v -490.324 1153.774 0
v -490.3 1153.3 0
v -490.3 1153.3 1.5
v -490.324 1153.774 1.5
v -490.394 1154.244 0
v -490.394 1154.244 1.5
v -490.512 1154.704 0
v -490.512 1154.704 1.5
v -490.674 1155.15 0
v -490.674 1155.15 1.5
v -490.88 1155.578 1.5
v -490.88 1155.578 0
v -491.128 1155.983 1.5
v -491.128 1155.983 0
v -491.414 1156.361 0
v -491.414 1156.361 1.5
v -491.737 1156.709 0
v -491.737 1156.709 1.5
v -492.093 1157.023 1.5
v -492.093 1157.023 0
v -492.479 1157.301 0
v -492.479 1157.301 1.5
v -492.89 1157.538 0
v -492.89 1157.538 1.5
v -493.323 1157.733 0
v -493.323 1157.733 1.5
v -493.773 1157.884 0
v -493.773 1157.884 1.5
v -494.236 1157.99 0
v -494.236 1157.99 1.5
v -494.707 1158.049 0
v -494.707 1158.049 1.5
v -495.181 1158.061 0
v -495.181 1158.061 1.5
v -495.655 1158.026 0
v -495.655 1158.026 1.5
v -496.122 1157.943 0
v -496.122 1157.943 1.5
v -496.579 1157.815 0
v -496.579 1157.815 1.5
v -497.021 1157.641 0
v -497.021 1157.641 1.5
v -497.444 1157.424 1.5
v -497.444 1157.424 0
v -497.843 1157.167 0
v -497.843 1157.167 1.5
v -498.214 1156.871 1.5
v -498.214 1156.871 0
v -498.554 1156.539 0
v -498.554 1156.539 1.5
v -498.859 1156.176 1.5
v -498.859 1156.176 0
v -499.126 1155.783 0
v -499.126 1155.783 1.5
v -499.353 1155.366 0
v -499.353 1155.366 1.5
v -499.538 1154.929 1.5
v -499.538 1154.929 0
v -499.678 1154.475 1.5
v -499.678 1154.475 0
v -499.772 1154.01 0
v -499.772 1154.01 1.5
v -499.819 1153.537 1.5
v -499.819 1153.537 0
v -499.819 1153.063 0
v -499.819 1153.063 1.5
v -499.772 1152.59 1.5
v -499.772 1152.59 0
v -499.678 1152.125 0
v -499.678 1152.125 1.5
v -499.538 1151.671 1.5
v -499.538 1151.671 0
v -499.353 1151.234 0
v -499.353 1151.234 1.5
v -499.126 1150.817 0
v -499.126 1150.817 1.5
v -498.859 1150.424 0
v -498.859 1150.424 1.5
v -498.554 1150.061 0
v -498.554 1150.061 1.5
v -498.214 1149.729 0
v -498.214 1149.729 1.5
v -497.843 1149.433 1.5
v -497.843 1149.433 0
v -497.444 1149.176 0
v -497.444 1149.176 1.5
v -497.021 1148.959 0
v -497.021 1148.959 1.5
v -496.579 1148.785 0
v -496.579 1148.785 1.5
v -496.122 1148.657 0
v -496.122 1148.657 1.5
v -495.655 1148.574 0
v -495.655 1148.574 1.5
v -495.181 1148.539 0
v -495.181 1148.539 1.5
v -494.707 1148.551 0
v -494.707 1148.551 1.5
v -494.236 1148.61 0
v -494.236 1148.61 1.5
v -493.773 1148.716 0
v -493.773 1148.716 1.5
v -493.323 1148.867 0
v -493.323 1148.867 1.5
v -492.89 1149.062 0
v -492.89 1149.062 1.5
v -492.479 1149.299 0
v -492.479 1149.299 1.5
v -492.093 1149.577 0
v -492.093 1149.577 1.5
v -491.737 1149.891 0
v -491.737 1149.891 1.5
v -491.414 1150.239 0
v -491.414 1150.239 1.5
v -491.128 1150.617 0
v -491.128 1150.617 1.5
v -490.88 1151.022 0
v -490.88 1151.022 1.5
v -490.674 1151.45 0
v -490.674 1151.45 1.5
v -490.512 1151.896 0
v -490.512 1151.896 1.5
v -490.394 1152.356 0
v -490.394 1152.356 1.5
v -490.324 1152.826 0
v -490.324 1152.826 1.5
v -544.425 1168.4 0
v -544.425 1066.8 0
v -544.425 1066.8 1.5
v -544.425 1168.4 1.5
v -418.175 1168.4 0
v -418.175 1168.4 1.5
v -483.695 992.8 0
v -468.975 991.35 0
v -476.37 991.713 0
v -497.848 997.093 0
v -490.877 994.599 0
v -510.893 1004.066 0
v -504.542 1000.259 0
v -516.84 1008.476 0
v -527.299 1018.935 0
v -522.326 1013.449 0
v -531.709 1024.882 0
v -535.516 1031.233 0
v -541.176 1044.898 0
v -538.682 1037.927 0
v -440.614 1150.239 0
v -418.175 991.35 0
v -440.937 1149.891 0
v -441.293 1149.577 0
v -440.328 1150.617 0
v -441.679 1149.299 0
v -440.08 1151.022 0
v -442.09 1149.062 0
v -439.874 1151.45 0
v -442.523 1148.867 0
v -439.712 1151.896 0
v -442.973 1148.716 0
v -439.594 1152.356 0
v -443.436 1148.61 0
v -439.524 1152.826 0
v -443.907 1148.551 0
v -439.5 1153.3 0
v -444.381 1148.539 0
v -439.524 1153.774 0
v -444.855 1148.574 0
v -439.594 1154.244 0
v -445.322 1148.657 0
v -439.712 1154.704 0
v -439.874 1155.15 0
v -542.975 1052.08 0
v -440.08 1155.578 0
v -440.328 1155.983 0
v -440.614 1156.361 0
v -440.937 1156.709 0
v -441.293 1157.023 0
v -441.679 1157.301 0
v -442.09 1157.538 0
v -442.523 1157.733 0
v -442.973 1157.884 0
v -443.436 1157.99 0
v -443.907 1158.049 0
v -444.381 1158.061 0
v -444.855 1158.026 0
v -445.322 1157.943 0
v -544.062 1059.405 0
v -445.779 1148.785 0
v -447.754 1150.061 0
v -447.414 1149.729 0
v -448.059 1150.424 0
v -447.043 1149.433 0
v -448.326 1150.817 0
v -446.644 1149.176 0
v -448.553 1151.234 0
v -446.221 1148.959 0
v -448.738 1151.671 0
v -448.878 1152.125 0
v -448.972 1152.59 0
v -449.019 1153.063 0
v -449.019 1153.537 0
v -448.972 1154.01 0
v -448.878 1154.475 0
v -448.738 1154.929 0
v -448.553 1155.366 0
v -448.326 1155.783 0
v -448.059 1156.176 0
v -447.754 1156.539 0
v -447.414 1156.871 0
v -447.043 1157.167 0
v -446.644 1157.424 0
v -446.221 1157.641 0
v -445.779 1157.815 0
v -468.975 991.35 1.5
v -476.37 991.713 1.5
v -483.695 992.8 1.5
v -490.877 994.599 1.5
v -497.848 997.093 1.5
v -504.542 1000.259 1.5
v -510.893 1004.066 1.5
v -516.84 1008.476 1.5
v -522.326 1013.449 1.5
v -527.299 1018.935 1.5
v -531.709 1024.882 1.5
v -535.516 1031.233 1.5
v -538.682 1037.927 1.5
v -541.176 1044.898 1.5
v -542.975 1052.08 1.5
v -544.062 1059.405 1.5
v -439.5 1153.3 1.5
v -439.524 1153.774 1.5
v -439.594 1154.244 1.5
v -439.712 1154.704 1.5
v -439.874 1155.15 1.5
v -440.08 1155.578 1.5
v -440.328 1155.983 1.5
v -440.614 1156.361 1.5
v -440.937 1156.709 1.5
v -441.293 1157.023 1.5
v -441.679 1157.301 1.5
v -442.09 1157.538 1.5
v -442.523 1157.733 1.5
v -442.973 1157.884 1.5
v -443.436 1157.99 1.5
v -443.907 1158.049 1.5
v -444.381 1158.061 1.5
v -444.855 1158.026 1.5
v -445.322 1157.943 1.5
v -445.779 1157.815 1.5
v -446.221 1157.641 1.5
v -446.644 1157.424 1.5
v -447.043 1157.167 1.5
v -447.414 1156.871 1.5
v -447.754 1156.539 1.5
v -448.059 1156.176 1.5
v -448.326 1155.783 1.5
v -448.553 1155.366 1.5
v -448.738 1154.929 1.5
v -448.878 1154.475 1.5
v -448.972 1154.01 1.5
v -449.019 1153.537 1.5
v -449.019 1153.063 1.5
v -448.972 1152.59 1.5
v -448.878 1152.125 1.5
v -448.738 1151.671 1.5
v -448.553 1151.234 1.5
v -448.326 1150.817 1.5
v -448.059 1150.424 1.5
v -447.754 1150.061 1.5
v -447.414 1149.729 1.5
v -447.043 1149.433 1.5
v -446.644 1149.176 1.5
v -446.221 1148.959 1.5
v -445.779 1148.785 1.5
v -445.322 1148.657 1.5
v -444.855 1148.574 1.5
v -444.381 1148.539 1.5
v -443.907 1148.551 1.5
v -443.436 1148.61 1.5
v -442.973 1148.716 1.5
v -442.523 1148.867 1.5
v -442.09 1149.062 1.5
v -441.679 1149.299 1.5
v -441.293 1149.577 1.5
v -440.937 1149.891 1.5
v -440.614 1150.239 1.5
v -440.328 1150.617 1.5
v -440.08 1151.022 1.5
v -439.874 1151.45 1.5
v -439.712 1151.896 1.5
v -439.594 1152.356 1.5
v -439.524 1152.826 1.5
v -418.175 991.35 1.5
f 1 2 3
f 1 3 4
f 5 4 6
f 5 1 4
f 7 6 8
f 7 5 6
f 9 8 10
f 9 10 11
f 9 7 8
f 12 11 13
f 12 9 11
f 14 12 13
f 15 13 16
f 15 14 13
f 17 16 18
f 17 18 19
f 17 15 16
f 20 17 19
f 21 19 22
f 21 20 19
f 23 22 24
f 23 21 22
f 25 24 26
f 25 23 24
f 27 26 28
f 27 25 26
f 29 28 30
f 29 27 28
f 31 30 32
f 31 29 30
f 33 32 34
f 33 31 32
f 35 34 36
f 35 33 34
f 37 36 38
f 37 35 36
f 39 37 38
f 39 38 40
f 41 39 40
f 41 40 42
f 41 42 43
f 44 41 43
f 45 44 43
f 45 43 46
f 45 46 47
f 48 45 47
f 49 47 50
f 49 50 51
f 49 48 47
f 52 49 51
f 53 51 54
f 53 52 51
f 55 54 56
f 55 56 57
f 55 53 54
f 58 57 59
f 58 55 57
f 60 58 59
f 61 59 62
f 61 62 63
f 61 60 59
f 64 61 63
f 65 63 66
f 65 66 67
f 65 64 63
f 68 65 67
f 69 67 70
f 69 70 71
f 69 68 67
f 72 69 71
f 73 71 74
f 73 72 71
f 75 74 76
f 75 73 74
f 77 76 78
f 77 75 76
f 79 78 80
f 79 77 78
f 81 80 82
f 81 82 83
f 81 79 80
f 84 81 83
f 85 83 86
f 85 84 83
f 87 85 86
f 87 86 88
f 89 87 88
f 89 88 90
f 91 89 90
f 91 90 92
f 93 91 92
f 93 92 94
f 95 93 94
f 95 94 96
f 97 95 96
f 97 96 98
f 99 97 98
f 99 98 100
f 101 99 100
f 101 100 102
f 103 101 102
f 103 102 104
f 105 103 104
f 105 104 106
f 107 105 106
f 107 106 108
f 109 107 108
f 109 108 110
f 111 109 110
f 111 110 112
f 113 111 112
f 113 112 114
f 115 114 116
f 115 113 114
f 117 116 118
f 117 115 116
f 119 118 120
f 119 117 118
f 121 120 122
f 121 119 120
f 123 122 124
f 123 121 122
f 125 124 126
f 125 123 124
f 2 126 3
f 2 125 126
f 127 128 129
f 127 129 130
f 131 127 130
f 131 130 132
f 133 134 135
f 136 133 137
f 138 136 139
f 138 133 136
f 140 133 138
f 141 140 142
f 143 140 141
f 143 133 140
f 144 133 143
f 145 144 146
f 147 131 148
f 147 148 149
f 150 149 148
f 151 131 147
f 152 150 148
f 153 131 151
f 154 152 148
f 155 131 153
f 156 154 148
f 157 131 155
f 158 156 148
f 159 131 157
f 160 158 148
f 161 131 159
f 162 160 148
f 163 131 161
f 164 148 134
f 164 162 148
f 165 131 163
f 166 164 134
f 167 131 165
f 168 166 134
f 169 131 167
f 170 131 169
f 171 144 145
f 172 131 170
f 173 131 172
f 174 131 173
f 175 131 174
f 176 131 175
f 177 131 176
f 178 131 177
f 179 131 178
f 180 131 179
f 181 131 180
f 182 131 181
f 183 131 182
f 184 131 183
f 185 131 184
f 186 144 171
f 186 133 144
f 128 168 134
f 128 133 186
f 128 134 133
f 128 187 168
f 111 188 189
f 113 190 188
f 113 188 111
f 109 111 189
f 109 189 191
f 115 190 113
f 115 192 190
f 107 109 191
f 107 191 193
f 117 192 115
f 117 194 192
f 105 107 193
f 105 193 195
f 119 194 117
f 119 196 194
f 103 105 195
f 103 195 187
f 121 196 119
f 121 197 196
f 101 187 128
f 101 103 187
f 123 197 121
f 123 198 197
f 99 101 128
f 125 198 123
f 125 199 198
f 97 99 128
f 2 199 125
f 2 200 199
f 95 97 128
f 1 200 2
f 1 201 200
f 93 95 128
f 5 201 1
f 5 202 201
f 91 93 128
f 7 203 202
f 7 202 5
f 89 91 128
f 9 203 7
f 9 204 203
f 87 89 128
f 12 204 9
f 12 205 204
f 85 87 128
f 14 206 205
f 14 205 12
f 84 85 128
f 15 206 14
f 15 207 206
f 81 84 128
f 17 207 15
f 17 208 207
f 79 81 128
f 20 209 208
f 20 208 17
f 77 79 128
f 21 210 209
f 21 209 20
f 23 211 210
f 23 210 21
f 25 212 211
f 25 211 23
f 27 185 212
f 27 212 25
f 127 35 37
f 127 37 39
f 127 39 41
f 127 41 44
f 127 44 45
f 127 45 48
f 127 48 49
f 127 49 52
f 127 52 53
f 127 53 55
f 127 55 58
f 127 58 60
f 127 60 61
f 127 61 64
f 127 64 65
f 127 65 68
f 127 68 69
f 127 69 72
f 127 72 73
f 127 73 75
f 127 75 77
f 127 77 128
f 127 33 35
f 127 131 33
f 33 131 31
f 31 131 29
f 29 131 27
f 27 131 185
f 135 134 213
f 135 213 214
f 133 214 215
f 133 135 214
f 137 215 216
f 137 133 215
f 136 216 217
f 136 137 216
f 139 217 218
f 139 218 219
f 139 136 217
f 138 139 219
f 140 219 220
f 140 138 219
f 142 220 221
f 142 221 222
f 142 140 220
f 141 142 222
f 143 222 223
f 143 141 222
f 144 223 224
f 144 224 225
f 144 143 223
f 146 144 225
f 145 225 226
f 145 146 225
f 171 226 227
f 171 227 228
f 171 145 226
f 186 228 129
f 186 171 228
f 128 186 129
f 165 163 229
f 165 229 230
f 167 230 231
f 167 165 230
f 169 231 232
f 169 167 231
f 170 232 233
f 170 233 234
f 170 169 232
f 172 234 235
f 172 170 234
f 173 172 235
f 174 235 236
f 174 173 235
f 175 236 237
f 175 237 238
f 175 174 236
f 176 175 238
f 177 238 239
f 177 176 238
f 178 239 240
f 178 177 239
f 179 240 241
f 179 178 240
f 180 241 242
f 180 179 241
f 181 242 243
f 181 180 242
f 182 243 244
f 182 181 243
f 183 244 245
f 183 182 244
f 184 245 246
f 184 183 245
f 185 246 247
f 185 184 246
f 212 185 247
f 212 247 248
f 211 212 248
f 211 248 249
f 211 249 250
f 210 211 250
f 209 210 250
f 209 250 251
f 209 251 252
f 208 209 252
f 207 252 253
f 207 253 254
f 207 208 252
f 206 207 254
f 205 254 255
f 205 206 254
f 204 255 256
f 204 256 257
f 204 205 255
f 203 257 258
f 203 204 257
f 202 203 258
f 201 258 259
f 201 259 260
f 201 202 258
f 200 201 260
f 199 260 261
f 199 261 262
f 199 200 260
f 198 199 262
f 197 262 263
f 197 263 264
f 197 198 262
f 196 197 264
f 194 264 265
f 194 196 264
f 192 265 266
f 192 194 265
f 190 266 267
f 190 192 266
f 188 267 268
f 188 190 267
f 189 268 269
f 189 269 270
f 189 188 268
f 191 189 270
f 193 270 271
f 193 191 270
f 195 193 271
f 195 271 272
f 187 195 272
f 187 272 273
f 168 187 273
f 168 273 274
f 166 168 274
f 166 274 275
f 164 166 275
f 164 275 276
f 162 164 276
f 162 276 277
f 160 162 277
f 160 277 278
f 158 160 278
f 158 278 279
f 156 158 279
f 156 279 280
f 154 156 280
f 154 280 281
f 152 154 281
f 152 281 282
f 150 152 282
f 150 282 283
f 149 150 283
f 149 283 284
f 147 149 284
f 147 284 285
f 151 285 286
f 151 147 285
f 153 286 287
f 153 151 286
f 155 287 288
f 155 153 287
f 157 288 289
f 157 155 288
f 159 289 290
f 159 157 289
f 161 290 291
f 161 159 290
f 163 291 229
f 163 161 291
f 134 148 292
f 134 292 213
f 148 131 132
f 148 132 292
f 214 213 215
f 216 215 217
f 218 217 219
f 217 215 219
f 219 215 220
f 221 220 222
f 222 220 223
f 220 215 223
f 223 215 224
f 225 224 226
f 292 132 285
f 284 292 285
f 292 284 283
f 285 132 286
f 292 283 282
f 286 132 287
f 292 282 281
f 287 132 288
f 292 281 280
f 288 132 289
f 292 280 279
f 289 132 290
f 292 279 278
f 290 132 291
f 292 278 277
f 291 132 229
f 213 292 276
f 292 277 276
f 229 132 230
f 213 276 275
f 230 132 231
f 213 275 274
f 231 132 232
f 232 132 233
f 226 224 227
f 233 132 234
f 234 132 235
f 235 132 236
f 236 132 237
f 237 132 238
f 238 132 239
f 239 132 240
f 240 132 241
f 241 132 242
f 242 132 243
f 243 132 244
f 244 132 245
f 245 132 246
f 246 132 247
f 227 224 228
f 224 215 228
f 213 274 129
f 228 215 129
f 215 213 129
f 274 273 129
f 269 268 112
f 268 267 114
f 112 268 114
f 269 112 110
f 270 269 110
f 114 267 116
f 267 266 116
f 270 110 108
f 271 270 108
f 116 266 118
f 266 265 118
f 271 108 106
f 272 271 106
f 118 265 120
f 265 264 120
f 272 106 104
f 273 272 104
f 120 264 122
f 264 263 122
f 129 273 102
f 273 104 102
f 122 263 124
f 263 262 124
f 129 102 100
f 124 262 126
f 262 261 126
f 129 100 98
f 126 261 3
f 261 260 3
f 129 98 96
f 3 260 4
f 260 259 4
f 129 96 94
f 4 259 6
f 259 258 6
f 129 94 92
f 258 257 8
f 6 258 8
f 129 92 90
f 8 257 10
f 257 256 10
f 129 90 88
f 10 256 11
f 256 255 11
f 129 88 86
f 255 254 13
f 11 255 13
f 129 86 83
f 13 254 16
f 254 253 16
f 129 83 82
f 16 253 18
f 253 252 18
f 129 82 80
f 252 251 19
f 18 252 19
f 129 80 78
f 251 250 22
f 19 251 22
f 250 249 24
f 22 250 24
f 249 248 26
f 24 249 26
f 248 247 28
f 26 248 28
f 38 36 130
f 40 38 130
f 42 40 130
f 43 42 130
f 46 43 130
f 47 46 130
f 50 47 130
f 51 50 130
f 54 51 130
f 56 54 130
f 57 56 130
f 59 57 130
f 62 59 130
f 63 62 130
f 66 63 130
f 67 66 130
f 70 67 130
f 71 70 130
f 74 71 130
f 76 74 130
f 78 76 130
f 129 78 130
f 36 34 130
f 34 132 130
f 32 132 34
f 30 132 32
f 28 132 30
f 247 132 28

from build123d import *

# Parameters (mm, degrees)
SKETCH1_R      = 4.7625
EXTRUDE1_DEPTH = 1.5


with BuildPart() as part:
    # Sketch1 → Extrude1 (new body)
    with BuildSketch(Plane.XY):
        with BuildLine():
            Line((-418.175, 991.35), (-468.975, 991.35))
            ThreePointArc((-468.975, 991.35), (-522.326206641, 1013.448793359), (-544.425, 1066.8))
            Line((-544.425, 1066.8), (-544.425, 1168.4))
            Line((-544.425, 1168.4), (-418.175, 1168.4))
            Line((-418.175, 1168.4), (-418.175, 991.35))
        make_face()
        with Locations((-444.2625, 1153.3)):
            Circle(SKETCH1_R, mode=Mode.SUBTRACT)
        with Locations((-495.0625, 1153.3)):
            Circle(SKETCH1_R, mode=Mode.SUBTRACT)
    extrude(amount=EXTRUDE1_DEPTH)


solid = part.part
